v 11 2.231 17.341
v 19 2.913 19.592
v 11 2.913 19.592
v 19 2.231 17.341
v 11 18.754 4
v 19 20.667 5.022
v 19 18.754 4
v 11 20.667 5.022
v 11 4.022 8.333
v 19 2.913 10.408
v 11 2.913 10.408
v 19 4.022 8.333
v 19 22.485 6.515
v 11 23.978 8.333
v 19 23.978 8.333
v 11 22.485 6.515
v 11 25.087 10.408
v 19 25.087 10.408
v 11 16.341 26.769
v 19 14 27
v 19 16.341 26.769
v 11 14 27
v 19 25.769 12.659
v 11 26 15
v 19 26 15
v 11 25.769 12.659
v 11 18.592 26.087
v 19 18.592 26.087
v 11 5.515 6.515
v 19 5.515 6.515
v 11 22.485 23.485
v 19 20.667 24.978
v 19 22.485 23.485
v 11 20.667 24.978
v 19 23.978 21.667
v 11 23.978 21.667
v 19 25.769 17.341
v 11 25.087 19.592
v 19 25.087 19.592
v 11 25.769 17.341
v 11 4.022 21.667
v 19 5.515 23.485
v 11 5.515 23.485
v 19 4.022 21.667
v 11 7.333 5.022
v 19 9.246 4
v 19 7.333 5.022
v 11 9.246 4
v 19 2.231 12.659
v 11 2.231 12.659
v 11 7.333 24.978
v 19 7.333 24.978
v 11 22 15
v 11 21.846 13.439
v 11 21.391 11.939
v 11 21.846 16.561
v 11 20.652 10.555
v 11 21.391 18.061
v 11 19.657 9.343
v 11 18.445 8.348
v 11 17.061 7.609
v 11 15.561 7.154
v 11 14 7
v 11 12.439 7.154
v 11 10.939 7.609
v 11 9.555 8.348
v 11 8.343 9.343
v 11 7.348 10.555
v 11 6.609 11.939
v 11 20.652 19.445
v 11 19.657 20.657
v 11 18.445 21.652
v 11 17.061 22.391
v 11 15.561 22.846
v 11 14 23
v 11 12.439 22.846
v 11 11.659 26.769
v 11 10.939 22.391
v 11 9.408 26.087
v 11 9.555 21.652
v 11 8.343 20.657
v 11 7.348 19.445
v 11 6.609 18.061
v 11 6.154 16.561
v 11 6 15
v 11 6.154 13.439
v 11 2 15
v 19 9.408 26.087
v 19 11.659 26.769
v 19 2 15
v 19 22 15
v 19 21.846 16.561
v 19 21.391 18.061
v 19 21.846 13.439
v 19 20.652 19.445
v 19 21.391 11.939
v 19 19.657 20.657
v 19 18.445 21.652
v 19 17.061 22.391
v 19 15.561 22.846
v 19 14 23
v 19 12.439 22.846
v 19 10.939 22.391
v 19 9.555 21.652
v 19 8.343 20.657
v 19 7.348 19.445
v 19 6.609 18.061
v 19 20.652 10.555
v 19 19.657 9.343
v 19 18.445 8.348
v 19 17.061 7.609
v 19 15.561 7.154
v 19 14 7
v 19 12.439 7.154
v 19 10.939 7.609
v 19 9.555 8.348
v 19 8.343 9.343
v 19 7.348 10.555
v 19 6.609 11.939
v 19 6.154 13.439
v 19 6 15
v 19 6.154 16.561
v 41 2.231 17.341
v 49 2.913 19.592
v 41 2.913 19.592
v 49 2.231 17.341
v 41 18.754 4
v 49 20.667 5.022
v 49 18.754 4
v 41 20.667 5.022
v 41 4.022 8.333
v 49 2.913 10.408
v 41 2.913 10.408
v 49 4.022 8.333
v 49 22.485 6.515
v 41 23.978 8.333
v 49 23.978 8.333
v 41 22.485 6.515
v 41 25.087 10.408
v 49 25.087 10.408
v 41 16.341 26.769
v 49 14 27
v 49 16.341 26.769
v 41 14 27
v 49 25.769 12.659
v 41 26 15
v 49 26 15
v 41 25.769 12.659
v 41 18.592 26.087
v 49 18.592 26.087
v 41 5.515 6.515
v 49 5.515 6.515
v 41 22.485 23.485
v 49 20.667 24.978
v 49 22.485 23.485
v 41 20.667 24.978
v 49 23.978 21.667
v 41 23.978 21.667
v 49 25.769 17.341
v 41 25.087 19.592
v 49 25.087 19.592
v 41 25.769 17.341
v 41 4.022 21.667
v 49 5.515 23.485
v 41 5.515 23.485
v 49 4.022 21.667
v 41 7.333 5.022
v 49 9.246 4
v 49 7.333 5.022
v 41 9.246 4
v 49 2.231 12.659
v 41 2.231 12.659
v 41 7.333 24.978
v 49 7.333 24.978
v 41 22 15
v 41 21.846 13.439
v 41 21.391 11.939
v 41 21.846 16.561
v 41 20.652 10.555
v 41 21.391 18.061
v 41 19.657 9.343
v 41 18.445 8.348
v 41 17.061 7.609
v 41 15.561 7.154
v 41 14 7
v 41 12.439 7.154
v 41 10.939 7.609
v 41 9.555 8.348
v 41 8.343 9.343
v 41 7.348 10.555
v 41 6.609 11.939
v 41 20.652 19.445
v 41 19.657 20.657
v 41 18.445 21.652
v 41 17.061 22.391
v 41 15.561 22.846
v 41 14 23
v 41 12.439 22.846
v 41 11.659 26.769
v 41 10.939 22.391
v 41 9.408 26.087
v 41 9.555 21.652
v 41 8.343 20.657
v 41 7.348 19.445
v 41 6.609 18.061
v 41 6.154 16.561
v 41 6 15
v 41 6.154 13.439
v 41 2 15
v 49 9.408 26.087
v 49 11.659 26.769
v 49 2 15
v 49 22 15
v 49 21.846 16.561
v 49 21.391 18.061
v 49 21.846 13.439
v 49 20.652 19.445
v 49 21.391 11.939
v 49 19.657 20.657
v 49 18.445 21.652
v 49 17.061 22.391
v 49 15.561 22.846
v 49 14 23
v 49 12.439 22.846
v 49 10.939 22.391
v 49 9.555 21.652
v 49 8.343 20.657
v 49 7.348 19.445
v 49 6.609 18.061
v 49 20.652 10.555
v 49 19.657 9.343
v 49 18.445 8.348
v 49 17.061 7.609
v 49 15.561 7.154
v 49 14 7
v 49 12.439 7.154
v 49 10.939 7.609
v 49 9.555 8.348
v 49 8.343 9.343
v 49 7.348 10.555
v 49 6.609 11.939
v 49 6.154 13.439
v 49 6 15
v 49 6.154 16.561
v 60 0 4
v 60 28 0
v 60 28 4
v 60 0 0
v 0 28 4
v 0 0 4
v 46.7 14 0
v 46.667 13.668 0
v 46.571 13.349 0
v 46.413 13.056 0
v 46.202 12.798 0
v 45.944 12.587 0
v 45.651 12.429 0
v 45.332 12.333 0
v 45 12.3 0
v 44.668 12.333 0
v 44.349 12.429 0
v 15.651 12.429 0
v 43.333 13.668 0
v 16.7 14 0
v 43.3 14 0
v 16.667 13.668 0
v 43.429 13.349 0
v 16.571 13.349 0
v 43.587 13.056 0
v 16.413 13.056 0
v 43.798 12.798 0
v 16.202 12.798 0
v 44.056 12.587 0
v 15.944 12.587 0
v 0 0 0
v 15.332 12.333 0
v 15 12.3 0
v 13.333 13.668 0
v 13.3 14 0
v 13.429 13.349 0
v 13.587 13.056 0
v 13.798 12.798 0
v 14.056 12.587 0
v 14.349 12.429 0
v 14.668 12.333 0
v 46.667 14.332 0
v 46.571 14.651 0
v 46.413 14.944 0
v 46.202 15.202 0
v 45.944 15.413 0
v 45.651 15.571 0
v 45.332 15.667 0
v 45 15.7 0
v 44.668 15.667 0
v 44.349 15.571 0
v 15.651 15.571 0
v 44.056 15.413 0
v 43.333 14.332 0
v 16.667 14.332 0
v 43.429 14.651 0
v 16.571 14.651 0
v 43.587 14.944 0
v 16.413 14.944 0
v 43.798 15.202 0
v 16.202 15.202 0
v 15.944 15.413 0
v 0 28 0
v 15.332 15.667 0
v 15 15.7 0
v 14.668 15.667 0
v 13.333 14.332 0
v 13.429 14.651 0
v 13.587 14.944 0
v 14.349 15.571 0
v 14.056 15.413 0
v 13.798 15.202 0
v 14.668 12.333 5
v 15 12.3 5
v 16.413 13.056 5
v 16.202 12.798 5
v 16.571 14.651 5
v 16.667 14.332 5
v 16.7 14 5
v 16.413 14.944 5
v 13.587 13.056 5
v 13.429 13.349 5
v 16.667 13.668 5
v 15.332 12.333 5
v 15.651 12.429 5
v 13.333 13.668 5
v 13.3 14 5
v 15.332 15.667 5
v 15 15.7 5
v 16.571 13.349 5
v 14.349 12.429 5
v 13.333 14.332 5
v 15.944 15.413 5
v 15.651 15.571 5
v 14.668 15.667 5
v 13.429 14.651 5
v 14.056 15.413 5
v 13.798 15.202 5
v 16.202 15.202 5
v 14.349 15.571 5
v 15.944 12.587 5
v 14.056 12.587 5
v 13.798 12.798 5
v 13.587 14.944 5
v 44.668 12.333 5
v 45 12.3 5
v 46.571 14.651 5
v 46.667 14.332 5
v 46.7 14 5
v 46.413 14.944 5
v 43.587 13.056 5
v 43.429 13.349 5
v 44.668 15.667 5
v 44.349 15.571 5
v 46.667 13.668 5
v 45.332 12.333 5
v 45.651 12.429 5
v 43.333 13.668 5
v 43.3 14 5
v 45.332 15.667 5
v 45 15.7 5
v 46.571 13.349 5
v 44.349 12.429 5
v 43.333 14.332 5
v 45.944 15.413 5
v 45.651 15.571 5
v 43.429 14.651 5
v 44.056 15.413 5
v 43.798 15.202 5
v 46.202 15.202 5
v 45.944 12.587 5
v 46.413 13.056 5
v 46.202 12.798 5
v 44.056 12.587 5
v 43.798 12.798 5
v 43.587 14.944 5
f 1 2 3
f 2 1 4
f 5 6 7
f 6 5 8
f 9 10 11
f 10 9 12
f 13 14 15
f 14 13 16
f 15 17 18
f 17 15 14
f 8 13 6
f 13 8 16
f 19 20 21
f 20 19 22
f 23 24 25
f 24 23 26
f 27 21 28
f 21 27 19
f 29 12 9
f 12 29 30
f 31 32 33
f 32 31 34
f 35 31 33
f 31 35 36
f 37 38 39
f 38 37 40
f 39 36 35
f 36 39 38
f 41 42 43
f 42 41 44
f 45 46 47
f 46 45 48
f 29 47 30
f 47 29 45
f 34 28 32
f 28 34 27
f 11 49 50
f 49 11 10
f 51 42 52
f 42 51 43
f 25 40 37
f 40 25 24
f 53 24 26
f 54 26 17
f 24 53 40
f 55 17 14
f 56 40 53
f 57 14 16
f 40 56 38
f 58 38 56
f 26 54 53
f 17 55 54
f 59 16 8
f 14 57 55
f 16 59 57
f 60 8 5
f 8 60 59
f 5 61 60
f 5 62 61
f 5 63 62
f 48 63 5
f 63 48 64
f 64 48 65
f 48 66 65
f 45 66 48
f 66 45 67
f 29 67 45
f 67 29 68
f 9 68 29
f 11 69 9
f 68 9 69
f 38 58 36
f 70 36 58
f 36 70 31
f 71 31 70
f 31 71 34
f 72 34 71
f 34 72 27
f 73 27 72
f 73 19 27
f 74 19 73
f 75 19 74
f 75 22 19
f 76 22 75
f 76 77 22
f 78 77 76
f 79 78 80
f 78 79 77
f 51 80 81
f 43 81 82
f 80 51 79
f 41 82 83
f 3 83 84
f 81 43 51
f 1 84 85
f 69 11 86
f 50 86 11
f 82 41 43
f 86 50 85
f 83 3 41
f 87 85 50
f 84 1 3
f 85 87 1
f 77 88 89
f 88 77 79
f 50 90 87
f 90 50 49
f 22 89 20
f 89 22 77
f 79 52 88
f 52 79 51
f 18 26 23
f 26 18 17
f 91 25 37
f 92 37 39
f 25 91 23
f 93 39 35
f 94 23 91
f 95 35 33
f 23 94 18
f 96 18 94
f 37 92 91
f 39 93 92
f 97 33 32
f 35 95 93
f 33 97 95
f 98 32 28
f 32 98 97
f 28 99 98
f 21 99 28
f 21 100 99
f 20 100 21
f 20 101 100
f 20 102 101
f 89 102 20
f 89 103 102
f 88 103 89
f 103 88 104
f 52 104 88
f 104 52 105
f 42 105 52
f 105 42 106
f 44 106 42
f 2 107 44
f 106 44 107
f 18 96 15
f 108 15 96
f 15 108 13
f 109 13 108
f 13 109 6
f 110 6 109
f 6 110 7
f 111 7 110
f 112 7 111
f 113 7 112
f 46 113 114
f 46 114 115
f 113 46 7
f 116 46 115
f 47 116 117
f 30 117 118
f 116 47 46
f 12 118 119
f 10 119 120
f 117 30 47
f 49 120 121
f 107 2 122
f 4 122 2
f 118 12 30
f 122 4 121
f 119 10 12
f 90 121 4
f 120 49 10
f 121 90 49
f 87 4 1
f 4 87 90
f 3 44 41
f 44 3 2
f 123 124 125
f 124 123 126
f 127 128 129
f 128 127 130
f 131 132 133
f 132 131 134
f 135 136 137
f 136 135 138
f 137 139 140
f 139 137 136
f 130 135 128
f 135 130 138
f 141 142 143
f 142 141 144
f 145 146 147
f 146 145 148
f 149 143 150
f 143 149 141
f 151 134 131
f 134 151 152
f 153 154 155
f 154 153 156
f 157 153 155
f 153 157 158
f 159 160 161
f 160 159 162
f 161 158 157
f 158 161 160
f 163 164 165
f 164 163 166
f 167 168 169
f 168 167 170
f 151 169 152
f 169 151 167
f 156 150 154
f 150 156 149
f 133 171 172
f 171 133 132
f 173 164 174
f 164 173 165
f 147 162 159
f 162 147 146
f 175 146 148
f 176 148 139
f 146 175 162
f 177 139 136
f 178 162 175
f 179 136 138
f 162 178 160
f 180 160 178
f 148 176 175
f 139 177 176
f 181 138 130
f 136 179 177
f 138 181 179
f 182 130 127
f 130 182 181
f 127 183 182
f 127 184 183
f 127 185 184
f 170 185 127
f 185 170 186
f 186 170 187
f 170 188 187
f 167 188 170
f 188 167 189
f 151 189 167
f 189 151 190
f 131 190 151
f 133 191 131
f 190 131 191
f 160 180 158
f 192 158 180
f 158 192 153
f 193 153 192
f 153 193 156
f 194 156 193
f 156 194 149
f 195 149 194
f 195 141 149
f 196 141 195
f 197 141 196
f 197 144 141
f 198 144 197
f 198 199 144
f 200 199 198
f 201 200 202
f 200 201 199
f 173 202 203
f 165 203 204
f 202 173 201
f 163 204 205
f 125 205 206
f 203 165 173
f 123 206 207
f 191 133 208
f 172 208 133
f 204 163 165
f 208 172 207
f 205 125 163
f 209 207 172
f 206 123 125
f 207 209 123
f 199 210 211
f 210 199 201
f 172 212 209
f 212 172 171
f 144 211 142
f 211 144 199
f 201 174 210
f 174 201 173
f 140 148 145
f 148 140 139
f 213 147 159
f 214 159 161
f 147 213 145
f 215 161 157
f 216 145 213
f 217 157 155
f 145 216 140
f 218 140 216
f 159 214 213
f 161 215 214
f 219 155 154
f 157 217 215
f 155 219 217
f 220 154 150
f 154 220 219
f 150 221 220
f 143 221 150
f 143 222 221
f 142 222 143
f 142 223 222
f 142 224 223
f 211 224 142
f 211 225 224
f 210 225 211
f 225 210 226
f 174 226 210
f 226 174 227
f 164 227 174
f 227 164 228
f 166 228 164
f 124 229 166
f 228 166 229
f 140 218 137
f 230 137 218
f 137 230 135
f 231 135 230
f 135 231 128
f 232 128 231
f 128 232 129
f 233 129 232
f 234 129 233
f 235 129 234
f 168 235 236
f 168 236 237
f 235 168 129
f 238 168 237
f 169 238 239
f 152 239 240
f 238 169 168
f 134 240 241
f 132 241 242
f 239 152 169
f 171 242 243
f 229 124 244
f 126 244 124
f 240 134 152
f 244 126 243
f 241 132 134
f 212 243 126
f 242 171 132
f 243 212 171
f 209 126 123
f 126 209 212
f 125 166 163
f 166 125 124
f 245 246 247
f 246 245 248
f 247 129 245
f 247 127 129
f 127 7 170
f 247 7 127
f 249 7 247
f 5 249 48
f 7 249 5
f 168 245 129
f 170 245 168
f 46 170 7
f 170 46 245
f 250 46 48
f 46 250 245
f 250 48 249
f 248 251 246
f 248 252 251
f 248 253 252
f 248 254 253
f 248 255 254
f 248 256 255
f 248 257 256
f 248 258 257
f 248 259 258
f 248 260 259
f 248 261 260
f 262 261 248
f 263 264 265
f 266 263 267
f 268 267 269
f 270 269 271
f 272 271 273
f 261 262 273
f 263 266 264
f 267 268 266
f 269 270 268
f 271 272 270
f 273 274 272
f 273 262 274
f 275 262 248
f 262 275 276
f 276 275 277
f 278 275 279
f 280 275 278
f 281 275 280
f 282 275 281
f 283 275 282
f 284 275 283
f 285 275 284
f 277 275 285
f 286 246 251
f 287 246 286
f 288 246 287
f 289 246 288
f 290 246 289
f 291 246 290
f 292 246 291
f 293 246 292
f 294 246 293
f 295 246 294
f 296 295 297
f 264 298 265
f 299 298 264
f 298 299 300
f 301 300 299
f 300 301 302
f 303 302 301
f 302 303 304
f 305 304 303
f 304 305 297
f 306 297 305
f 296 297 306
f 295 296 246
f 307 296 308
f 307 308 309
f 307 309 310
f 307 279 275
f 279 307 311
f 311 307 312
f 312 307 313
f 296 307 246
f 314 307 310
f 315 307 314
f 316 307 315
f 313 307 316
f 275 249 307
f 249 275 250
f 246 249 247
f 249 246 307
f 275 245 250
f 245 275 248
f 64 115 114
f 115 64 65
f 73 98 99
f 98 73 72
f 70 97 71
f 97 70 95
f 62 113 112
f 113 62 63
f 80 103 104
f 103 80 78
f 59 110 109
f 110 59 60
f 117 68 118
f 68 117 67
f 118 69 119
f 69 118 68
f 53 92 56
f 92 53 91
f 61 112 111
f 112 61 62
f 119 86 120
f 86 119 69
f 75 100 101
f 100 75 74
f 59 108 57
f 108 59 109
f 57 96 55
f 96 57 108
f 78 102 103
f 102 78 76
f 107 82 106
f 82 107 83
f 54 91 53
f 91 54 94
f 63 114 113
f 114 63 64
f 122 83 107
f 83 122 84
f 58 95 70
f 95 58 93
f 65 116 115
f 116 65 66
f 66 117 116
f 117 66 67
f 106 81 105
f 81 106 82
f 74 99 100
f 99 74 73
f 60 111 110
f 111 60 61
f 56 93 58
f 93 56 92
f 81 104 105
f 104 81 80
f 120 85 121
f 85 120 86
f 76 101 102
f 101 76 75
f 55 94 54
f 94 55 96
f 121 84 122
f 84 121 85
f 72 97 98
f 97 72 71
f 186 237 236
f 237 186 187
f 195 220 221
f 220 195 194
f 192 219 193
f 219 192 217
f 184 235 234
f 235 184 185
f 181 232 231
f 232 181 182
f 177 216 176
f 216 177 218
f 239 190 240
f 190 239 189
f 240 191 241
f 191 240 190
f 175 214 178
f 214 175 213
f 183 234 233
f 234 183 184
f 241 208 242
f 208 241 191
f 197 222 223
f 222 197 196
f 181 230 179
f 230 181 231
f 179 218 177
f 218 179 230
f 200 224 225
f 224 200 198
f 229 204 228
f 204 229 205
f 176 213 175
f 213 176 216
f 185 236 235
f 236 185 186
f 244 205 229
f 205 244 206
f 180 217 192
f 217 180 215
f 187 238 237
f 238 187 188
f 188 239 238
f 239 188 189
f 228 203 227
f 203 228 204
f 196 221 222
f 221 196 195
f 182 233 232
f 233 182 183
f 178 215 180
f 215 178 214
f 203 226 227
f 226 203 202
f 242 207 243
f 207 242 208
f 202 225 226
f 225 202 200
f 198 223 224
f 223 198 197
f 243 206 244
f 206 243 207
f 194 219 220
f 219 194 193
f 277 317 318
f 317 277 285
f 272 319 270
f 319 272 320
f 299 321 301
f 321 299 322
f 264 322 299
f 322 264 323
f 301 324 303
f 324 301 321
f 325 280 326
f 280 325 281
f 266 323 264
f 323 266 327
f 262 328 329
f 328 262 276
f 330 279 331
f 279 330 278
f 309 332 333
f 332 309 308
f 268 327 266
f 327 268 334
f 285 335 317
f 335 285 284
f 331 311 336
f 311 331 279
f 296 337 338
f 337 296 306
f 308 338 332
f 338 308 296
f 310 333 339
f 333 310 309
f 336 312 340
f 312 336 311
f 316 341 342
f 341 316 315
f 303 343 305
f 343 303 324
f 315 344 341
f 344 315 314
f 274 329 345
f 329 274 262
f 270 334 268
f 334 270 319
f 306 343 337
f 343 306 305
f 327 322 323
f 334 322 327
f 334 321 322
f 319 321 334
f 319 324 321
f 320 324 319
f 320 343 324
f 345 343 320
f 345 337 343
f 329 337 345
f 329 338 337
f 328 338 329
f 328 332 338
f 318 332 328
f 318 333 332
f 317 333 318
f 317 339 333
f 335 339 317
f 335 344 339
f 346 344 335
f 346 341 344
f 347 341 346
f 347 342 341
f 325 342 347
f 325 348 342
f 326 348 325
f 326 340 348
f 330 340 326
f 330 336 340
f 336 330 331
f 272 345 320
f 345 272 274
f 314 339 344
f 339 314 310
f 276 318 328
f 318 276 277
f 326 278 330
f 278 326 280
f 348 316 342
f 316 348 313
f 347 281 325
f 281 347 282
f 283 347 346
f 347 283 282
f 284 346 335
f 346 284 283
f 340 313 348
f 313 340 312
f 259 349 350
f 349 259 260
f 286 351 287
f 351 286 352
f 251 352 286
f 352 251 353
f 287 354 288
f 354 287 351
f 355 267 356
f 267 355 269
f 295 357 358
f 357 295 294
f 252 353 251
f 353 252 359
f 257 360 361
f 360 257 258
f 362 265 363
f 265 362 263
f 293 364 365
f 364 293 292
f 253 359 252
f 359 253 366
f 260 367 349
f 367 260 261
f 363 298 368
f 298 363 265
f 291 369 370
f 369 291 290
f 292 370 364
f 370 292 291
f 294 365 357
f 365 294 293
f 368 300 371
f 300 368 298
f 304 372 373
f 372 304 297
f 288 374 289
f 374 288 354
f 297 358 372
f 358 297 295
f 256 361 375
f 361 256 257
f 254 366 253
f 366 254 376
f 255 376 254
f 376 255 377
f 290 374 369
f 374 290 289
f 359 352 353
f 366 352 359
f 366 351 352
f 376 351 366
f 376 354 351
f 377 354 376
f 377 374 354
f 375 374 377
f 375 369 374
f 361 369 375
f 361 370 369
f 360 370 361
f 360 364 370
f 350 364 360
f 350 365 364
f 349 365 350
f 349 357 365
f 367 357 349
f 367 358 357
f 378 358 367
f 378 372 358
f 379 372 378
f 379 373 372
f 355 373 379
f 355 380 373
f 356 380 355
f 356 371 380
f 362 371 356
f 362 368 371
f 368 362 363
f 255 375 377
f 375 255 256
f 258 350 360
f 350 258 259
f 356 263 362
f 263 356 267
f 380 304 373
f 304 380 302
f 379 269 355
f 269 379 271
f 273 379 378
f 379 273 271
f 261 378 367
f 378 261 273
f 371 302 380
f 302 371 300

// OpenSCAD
$fn = 32;

// ----------------------------------------------------------------------
// Cable clip: cable 16 mm, clamp 24 mm, base 60 mm
// ----------------------------------------------------------------------

// --- parameters (mm) ---
foot_w = 60;              // base length, X
foot_d = 28;              // base width, Y
foot_t = 4;               // base thickness
hose_seat_d = 24;         // clamp outside diameter
ring_t = 4;               // clamp wall
cable_d = 16;             // cable opening
ring_w = 8;               // clamp width along the cable
screw_d = 3.4;            // screw clearance
sink = 1;                 // overlap of the clamp into the base
pitch = 30;               // distance between the two clamps

module base() {
  cube([foot_w, foot_d, foot_t]);
}

module clamps() {
  for (sx = [-1, 1])
    translate([foot_w / 2 + sx * pitch / 2, foot_d / 2, foot_t + hose_seat_d / 2 - sink]) rotate([0, 90, 0])
      cylinder(h = ring_w, d = hose_seat_d, center = true);
}

difference() {
  union() {
    base();
    clamps();
  }
  for (sx = [-1, 1])
    translate([foot_w / 2 + sx * pitch / 2, foot_d / 2, foot_t + hose_seat_d / 2 - sink]) rotate([0, 90, 0]) translate([0, 0, -ring_w / 2 - 1]) cylinder(h = ring_w + 2, d = cable_d);
  translate([15, foot_d / 2, -1]) cylinder(h = foot_t + 2, d = screw_d);
  translate([45, foot_d / 2, -1]) cylinder(h = foot_t + 2, d = screw_d);
}
